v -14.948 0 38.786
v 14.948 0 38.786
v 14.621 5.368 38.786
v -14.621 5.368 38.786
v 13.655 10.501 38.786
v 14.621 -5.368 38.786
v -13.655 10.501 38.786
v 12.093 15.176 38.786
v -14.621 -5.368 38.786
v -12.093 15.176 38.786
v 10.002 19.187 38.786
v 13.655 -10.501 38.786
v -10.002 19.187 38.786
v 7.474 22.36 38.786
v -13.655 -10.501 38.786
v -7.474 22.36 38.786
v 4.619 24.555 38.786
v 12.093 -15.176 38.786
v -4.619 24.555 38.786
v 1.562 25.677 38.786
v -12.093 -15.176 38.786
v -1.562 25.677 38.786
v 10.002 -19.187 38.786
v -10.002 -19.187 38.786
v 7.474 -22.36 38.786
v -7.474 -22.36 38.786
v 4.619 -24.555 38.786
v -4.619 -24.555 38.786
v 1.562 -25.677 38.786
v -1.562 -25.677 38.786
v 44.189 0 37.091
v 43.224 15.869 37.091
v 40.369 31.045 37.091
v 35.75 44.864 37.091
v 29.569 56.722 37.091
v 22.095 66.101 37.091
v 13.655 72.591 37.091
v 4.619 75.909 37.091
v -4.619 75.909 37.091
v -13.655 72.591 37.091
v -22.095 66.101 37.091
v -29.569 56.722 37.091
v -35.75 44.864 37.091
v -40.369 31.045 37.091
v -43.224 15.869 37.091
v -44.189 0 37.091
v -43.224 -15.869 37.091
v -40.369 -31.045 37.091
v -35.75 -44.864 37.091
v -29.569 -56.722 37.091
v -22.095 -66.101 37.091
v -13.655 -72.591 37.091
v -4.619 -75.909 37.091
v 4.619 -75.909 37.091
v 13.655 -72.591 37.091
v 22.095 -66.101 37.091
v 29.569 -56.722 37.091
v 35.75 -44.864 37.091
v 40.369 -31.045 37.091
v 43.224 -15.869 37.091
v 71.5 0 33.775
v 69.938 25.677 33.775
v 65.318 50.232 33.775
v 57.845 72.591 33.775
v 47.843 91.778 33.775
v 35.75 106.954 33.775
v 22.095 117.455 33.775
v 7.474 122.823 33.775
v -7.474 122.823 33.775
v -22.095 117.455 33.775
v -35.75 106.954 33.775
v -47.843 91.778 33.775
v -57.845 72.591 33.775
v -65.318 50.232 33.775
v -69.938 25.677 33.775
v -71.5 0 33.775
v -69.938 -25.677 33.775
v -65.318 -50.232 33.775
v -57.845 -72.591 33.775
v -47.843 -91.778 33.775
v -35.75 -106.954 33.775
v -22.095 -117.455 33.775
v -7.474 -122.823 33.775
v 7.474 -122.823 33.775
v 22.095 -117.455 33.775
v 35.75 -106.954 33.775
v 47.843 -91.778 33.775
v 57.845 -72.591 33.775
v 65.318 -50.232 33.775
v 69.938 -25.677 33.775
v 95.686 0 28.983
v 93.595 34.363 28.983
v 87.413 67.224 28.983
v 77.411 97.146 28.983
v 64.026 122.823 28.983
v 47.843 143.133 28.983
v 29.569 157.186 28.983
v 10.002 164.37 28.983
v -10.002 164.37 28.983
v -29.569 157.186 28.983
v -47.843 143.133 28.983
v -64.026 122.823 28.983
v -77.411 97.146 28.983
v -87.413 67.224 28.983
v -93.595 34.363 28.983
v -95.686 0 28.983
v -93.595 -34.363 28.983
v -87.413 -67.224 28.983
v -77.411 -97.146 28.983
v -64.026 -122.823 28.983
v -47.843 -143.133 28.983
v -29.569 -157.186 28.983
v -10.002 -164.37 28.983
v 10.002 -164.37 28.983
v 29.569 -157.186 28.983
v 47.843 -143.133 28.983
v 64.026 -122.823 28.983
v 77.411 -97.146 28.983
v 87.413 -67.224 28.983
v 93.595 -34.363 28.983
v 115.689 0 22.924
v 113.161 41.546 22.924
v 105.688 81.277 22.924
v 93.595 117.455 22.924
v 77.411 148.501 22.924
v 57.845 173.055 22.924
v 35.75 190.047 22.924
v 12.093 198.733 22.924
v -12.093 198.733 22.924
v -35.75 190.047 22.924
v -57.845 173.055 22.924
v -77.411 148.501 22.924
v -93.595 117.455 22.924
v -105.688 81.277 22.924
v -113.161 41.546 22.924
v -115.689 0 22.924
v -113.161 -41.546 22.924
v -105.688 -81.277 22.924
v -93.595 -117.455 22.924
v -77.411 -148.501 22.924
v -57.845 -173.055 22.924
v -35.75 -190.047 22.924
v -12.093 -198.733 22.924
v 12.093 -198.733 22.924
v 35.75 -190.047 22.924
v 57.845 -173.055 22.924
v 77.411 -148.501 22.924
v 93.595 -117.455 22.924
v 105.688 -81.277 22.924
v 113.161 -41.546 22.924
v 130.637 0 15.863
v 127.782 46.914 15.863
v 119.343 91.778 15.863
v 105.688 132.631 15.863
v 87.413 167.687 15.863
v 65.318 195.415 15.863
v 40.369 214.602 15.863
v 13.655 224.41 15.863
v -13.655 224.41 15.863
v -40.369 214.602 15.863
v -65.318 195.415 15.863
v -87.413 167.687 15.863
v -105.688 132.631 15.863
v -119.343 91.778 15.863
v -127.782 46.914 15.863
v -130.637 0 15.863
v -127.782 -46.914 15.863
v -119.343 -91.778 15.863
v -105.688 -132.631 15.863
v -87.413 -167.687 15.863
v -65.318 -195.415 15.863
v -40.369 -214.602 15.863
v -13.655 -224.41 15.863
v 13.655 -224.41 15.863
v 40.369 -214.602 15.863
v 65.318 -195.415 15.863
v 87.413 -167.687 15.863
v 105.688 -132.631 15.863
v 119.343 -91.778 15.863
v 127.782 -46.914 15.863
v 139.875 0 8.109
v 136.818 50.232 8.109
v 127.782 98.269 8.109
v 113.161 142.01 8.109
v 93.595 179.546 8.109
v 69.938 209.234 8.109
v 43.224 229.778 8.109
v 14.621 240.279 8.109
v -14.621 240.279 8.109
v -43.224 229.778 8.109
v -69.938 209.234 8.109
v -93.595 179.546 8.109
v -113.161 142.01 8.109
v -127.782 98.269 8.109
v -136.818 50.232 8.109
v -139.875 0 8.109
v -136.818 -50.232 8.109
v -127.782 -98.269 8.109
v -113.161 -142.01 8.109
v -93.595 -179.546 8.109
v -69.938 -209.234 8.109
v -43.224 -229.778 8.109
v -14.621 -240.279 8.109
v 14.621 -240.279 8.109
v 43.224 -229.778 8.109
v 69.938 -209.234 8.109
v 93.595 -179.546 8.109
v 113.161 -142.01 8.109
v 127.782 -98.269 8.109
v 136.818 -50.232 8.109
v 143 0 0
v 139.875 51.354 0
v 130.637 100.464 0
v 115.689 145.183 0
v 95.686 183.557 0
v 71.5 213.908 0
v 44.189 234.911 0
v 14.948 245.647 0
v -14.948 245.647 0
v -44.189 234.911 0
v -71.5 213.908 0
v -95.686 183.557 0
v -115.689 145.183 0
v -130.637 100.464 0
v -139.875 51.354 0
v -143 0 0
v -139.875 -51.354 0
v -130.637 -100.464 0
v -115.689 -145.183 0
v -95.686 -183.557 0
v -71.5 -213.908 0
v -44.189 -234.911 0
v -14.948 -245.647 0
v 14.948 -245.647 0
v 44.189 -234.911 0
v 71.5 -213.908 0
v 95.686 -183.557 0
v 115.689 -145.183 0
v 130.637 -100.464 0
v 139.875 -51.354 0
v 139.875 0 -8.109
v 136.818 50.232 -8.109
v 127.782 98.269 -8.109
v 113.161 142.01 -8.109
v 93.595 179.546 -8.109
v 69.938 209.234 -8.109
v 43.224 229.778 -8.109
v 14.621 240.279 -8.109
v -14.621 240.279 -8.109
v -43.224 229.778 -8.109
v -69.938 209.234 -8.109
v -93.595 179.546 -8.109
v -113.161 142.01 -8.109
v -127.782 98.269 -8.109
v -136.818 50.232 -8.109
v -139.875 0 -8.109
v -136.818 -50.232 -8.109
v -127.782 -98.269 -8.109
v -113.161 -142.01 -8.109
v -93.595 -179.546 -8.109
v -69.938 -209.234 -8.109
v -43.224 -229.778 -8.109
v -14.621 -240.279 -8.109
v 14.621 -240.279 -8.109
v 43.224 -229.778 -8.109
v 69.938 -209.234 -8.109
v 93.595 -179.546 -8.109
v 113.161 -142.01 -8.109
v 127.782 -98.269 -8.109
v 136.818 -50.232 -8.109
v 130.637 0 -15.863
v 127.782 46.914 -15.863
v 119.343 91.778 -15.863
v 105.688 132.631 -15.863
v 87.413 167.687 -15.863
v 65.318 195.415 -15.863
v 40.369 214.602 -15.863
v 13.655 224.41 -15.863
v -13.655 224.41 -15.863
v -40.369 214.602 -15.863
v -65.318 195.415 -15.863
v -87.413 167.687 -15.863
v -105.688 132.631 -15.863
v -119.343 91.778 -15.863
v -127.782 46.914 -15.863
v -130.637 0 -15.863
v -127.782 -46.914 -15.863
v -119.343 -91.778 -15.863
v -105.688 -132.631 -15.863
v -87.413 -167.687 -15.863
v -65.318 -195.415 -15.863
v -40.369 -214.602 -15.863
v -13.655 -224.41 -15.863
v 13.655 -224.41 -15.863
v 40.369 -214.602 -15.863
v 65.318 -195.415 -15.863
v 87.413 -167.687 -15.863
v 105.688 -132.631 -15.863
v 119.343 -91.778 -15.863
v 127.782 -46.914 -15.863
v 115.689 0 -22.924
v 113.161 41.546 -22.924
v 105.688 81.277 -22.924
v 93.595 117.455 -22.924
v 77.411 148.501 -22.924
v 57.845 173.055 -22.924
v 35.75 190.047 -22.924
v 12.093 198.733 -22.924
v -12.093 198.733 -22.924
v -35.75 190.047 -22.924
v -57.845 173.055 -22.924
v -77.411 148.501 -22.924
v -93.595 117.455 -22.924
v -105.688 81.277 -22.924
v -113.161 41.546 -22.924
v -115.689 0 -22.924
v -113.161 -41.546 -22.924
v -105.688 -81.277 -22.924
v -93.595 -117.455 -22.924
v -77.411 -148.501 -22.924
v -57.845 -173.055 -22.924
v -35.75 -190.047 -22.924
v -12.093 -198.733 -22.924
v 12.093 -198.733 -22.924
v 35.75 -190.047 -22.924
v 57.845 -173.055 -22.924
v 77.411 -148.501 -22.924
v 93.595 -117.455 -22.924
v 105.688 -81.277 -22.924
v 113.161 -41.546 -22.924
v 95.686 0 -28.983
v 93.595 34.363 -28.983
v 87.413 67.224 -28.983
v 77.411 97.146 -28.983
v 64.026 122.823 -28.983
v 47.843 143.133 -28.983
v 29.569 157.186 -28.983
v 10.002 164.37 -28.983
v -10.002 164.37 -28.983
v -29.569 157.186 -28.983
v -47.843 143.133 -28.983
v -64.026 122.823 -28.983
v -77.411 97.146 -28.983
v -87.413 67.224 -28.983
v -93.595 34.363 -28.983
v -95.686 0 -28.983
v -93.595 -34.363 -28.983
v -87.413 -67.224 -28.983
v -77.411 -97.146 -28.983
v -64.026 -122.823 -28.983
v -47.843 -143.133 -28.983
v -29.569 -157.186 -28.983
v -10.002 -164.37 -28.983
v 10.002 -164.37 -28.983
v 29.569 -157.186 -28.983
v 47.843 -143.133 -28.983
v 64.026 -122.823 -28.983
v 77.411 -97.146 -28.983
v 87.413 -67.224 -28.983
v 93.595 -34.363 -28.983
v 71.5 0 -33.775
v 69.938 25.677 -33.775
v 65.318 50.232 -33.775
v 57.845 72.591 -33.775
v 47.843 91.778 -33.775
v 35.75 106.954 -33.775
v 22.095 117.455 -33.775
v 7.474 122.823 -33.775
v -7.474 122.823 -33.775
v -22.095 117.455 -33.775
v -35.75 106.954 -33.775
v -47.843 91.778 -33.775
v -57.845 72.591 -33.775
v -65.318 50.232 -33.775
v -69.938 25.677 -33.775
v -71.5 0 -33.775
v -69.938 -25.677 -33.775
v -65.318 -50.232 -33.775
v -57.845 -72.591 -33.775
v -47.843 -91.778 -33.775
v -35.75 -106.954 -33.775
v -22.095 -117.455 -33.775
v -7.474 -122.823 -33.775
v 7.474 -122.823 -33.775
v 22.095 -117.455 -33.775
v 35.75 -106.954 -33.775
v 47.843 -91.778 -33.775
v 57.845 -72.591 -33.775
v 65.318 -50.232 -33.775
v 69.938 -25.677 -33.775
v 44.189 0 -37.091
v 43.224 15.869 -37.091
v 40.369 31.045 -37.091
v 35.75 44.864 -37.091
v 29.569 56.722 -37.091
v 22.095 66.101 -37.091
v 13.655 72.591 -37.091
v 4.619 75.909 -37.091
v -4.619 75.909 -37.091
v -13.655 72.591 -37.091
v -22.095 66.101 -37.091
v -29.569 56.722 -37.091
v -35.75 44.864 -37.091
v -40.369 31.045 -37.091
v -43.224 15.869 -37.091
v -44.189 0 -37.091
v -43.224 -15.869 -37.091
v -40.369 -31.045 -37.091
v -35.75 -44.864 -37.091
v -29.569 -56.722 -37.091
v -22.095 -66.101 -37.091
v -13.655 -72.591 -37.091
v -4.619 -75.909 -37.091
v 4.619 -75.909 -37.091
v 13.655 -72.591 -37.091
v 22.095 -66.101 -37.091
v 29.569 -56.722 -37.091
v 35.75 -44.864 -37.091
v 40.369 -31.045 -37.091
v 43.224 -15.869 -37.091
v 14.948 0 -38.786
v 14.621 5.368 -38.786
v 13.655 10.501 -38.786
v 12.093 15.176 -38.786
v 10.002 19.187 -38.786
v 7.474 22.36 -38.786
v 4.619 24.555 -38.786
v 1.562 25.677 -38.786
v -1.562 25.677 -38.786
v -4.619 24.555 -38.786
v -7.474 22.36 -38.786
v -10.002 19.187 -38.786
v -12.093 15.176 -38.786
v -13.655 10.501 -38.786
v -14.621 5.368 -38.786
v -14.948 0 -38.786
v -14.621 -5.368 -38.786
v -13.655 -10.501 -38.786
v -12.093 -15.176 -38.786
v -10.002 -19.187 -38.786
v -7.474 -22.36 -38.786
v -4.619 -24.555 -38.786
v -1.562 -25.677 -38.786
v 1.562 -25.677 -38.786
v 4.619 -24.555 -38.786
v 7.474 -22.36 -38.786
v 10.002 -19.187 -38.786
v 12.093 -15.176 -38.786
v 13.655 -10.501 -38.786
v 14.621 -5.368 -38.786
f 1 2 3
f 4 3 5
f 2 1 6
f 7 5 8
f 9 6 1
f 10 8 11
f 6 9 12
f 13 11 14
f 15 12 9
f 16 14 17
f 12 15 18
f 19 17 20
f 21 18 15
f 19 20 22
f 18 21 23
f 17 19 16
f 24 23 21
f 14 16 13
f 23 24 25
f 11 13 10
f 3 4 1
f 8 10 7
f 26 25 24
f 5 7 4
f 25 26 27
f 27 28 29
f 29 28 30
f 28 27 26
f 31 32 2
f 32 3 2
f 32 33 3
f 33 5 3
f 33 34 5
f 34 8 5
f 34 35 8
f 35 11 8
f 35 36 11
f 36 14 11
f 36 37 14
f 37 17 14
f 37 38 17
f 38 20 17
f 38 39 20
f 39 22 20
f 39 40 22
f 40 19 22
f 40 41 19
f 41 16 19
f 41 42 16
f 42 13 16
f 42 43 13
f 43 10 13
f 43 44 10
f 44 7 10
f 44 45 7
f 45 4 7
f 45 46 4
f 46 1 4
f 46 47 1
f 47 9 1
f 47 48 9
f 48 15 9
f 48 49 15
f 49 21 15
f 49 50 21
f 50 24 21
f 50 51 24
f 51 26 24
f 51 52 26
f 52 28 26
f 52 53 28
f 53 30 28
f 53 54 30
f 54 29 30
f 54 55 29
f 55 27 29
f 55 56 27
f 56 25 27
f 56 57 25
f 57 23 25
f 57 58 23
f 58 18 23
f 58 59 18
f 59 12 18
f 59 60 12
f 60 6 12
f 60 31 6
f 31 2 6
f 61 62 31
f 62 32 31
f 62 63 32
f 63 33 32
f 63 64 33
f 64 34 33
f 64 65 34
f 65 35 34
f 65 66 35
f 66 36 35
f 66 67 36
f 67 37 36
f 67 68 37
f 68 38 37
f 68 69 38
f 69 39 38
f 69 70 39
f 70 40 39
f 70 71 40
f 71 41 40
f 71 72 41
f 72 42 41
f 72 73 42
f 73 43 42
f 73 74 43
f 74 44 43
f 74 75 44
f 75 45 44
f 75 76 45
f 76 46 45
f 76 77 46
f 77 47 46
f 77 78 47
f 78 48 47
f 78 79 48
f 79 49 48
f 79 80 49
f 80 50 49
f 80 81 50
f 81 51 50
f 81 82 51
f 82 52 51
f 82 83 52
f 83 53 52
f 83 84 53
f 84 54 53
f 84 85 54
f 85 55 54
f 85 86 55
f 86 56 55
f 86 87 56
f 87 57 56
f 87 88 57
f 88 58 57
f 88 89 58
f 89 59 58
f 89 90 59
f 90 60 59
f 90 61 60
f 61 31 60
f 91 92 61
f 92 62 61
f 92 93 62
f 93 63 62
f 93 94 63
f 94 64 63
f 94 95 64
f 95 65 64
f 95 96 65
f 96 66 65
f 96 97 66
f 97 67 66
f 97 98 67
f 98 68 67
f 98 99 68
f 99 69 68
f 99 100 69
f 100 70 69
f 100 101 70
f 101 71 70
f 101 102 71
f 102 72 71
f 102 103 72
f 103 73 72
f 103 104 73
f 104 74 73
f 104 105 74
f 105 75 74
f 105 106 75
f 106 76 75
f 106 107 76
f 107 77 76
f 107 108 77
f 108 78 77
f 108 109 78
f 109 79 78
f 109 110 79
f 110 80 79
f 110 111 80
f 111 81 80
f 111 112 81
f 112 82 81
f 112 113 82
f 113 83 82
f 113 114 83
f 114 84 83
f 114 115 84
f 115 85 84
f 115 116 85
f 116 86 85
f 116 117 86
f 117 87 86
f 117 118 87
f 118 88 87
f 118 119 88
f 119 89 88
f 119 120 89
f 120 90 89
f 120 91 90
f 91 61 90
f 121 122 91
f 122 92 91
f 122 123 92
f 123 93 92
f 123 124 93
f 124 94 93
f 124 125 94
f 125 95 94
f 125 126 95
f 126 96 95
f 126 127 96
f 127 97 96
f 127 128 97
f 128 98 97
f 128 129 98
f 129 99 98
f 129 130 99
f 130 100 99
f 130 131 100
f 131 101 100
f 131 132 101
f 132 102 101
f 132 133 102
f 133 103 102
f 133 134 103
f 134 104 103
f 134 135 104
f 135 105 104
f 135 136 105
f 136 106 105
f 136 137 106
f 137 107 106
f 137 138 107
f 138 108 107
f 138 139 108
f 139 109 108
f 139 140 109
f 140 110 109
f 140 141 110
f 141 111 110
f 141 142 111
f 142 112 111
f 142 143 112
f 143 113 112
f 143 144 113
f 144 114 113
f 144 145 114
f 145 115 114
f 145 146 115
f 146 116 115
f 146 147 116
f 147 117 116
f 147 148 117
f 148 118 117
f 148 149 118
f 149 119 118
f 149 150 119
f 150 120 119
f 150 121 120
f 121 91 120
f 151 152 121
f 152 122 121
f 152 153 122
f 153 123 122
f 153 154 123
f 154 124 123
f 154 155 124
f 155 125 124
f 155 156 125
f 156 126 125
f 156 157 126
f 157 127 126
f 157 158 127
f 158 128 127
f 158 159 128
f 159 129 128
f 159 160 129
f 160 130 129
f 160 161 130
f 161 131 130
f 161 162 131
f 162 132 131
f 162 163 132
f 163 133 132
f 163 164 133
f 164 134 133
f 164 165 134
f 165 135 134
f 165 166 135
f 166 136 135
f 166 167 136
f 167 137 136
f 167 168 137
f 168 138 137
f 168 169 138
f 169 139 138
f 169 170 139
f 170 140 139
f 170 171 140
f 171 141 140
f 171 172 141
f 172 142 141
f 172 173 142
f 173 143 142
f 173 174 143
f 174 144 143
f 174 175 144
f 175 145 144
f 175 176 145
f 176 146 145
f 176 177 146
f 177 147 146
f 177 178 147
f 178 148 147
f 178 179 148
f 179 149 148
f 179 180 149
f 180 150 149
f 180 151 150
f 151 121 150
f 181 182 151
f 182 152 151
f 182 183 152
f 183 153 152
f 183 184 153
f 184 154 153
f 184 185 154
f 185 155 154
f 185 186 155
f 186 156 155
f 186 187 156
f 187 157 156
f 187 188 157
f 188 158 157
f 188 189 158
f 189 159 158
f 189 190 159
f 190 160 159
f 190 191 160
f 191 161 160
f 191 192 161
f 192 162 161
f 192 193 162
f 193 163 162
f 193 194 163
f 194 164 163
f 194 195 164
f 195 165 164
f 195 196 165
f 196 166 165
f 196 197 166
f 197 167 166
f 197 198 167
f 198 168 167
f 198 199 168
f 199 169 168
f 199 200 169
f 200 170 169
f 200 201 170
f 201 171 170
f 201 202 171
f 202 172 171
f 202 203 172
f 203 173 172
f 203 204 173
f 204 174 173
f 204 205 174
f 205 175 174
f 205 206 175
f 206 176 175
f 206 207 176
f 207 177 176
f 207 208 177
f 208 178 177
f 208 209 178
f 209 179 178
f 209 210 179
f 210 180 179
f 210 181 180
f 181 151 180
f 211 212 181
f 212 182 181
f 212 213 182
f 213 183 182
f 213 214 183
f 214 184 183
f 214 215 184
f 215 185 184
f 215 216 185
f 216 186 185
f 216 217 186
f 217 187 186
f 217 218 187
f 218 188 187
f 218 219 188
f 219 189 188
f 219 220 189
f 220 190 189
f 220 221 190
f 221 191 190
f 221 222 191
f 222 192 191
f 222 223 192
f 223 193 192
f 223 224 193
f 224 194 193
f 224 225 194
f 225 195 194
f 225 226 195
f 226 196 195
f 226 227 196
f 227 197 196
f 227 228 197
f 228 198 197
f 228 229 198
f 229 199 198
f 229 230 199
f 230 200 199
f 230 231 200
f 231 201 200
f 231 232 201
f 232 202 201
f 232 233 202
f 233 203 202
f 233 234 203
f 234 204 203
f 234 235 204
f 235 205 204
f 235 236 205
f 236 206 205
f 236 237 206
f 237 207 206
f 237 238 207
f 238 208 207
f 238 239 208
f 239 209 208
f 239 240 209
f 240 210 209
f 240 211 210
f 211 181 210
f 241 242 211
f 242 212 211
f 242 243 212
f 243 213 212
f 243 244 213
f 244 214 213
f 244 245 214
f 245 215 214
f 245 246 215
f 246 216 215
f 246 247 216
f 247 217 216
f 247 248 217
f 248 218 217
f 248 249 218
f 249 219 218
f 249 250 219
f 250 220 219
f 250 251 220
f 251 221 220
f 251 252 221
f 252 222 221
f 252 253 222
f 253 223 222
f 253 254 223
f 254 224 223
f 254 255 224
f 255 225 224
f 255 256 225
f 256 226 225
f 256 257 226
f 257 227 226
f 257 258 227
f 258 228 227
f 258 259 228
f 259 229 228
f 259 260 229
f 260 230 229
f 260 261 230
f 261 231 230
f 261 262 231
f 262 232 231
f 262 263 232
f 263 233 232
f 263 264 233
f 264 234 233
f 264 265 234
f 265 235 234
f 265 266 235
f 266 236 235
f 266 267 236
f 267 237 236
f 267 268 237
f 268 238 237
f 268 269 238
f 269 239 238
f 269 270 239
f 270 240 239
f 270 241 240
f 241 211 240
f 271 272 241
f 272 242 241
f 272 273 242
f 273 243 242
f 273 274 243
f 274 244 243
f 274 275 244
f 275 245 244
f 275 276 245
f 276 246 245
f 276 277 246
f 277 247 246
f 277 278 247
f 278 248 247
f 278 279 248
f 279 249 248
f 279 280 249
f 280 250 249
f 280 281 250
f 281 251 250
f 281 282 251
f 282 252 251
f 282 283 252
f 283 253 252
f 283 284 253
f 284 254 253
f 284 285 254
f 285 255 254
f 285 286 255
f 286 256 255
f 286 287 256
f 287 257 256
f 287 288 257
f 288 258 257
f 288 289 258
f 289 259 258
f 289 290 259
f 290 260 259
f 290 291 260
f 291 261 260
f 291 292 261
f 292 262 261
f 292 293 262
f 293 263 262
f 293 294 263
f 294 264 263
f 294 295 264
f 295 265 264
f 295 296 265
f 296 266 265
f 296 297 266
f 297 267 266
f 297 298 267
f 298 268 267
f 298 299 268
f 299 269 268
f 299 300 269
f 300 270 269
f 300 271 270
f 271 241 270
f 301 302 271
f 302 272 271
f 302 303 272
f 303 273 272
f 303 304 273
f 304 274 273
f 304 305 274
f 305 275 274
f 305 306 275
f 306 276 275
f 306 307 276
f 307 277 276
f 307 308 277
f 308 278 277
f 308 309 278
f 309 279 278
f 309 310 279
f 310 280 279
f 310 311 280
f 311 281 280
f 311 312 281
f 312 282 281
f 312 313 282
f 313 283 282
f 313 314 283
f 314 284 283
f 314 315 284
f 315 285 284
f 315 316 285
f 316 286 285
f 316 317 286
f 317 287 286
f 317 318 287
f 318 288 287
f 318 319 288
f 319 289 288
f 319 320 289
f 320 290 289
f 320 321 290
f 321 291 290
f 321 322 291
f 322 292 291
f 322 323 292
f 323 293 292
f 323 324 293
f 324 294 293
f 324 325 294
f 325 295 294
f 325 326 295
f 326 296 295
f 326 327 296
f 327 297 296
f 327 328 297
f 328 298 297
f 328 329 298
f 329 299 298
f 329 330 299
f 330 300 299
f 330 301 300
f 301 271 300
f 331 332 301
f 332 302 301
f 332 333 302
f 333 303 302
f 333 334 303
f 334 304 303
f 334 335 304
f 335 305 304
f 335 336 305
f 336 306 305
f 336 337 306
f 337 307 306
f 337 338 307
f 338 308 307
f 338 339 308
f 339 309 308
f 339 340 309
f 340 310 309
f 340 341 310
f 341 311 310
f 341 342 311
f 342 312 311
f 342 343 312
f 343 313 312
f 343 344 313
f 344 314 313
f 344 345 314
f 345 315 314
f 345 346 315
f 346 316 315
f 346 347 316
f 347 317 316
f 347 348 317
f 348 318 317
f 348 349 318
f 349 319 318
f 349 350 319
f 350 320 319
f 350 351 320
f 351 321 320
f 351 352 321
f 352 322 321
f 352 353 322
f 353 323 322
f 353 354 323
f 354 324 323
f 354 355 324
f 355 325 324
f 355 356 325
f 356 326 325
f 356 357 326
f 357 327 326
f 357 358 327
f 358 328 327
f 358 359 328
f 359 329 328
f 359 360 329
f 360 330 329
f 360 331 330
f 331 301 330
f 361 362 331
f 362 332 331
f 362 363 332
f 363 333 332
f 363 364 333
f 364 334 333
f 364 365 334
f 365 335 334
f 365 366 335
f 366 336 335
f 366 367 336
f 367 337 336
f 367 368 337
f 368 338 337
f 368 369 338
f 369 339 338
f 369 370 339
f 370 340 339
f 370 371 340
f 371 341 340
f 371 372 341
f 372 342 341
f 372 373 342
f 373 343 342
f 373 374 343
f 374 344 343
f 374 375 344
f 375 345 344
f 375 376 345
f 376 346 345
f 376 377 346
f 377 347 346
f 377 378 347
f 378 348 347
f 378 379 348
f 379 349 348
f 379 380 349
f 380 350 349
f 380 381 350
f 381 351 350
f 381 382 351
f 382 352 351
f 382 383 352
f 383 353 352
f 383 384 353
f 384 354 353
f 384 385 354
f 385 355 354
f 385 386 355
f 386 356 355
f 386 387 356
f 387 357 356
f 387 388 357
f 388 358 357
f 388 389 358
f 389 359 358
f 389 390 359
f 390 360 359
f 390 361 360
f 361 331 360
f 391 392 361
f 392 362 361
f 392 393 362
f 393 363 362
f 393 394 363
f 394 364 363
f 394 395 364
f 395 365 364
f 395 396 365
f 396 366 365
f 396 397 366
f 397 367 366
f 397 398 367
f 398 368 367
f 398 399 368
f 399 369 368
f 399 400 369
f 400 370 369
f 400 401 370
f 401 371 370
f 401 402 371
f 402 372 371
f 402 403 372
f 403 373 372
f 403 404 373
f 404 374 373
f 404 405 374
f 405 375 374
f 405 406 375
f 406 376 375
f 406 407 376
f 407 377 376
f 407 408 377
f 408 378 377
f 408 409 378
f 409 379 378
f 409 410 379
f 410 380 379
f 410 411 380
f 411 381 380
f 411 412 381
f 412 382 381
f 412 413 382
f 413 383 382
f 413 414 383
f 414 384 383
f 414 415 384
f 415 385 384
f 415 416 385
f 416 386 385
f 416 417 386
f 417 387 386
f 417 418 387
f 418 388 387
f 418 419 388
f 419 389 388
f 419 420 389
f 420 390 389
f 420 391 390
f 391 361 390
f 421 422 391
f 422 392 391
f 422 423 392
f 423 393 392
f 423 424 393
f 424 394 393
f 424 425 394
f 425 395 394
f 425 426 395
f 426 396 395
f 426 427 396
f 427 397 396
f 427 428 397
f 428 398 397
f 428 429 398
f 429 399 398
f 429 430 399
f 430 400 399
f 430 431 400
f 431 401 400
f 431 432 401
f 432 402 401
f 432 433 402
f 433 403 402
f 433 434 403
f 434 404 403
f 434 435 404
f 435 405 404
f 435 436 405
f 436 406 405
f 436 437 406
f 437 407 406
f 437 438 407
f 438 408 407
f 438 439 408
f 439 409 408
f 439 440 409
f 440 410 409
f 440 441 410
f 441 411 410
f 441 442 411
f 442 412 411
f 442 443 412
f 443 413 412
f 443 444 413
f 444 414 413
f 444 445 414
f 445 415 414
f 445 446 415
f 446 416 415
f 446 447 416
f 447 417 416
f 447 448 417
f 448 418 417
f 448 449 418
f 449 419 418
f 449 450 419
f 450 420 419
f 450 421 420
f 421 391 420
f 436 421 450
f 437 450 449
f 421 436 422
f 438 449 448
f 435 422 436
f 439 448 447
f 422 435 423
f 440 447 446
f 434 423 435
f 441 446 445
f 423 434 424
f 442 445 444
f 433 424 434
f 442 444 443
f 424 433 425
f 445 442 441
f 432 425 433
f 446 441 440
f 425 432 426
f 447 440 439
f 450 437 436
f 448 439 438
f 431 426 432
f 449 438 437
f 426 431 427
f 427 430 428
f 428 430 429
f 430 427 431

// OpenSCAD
// Generated by SolidPython 1.0.1 on 2020-07-29 00:46:50


scale(v = [11, 19, 3]) {
	sphere(r = 13);
}
/***********************************************
*********      SolidPython code:      **********
************************************************
 
# import packages: SolidPython
from solid import *
from solid.utils import *
from itertools import chain, combinations, permutations


class Resize:

    def __init__(self, scad_file):
        self.scad_file = scad_file
        #self.scad_file = import_scad(scad_file)
        # cone/cylinder param:
        self.r1 = 0
        self.r2 = 0
        self.h = 0
        # rectangular prism param:
        self.w = 0
        self.l = 0
        # ellipse param:
        self.r = 0

    # import OpenScad code (file name corresponds to shape)


    # classify shape + parameters
    def assign(self, param1, param2, param3):
        if self.scad_file == 'cone.scad':
            self.r1 = param1
            self.r2 = param2
            self.h = param3
        elif self.scad_file == 'cylinder.scad':
            self.r1 = param1
            self.r2 = param2
            self.h = param3
        elif self.scad_file == 'rectangularPrism.scad':
            self.h = param1
            self.l = param2
            self.w = param3
        else:
            self.r = param1
            self.h = param2

    # resize parameters
    def iterate(self):
        x = range(3, 20, 2)
        i = 1
        if self.scad_file == 'cone.scad':
            tempList = list(permutations(x, 2))
            for temp in tempList:
                param1 = temp[0]
                param2 = temp[1]
                filepath = 'produced_scad_files/' + 'cone' + str(param1) + '_' + str(param2) + '_' + '.scad'
                scad_render_to_file(cylinder(h=param1, r1=param2, r2=0), filepath)

        elif self.scad_file == 'cylinder.scad':
            tempList = list(permutations(x, 3))
            for temp in tempList:
                param1 = temp[0]
                param2 = temp[1]
                filepath = 'produced_scad_files/' + 'cylinder' + str(param1) + '_' + str(param2) + '_' + '.scad'
                scad_render_to_file(cylinder(h=param1, r1=param2, r2=param2), filepath)

        elif self.scad_file == 'rectangularPrism.scad':
            tempList = list(permutations(x, 3))
            for temp in tempList:
                param1 = temp[0]
                param2 = temp[1]
                param3 = temp[2]
                filepath = 'produced_scad_files/' + 'rectangularPrism' + str(param1) + '_' + str(param2) + '_' + str(
                    param3) + '.scad'
                scad_render_to_file(cube(size=(param1, param2, param3)), filepath)

        elif self.scad_file == 'ellipse.scad':
            tempList = list(permutations(x, 4))
            for temp in tempList:
                param1 = temp[0]
                param2 = temp[1]
                param3 = temp[2]
                param4 = temp[3]
                filepath = 'produced_scad_files/' + 'ellipse' + str(param1) + '_' + str(param2) + '_' + str(param3) + '_' + str(param4) + '.scad'
                scad_render_to_file(scale([param1, param2, param3])(sphere(r=param4)), filepath)

    def render_to_scadfile(self):
        scad_render_to_file(scad, 'example.scad') 
 
************************************************/
